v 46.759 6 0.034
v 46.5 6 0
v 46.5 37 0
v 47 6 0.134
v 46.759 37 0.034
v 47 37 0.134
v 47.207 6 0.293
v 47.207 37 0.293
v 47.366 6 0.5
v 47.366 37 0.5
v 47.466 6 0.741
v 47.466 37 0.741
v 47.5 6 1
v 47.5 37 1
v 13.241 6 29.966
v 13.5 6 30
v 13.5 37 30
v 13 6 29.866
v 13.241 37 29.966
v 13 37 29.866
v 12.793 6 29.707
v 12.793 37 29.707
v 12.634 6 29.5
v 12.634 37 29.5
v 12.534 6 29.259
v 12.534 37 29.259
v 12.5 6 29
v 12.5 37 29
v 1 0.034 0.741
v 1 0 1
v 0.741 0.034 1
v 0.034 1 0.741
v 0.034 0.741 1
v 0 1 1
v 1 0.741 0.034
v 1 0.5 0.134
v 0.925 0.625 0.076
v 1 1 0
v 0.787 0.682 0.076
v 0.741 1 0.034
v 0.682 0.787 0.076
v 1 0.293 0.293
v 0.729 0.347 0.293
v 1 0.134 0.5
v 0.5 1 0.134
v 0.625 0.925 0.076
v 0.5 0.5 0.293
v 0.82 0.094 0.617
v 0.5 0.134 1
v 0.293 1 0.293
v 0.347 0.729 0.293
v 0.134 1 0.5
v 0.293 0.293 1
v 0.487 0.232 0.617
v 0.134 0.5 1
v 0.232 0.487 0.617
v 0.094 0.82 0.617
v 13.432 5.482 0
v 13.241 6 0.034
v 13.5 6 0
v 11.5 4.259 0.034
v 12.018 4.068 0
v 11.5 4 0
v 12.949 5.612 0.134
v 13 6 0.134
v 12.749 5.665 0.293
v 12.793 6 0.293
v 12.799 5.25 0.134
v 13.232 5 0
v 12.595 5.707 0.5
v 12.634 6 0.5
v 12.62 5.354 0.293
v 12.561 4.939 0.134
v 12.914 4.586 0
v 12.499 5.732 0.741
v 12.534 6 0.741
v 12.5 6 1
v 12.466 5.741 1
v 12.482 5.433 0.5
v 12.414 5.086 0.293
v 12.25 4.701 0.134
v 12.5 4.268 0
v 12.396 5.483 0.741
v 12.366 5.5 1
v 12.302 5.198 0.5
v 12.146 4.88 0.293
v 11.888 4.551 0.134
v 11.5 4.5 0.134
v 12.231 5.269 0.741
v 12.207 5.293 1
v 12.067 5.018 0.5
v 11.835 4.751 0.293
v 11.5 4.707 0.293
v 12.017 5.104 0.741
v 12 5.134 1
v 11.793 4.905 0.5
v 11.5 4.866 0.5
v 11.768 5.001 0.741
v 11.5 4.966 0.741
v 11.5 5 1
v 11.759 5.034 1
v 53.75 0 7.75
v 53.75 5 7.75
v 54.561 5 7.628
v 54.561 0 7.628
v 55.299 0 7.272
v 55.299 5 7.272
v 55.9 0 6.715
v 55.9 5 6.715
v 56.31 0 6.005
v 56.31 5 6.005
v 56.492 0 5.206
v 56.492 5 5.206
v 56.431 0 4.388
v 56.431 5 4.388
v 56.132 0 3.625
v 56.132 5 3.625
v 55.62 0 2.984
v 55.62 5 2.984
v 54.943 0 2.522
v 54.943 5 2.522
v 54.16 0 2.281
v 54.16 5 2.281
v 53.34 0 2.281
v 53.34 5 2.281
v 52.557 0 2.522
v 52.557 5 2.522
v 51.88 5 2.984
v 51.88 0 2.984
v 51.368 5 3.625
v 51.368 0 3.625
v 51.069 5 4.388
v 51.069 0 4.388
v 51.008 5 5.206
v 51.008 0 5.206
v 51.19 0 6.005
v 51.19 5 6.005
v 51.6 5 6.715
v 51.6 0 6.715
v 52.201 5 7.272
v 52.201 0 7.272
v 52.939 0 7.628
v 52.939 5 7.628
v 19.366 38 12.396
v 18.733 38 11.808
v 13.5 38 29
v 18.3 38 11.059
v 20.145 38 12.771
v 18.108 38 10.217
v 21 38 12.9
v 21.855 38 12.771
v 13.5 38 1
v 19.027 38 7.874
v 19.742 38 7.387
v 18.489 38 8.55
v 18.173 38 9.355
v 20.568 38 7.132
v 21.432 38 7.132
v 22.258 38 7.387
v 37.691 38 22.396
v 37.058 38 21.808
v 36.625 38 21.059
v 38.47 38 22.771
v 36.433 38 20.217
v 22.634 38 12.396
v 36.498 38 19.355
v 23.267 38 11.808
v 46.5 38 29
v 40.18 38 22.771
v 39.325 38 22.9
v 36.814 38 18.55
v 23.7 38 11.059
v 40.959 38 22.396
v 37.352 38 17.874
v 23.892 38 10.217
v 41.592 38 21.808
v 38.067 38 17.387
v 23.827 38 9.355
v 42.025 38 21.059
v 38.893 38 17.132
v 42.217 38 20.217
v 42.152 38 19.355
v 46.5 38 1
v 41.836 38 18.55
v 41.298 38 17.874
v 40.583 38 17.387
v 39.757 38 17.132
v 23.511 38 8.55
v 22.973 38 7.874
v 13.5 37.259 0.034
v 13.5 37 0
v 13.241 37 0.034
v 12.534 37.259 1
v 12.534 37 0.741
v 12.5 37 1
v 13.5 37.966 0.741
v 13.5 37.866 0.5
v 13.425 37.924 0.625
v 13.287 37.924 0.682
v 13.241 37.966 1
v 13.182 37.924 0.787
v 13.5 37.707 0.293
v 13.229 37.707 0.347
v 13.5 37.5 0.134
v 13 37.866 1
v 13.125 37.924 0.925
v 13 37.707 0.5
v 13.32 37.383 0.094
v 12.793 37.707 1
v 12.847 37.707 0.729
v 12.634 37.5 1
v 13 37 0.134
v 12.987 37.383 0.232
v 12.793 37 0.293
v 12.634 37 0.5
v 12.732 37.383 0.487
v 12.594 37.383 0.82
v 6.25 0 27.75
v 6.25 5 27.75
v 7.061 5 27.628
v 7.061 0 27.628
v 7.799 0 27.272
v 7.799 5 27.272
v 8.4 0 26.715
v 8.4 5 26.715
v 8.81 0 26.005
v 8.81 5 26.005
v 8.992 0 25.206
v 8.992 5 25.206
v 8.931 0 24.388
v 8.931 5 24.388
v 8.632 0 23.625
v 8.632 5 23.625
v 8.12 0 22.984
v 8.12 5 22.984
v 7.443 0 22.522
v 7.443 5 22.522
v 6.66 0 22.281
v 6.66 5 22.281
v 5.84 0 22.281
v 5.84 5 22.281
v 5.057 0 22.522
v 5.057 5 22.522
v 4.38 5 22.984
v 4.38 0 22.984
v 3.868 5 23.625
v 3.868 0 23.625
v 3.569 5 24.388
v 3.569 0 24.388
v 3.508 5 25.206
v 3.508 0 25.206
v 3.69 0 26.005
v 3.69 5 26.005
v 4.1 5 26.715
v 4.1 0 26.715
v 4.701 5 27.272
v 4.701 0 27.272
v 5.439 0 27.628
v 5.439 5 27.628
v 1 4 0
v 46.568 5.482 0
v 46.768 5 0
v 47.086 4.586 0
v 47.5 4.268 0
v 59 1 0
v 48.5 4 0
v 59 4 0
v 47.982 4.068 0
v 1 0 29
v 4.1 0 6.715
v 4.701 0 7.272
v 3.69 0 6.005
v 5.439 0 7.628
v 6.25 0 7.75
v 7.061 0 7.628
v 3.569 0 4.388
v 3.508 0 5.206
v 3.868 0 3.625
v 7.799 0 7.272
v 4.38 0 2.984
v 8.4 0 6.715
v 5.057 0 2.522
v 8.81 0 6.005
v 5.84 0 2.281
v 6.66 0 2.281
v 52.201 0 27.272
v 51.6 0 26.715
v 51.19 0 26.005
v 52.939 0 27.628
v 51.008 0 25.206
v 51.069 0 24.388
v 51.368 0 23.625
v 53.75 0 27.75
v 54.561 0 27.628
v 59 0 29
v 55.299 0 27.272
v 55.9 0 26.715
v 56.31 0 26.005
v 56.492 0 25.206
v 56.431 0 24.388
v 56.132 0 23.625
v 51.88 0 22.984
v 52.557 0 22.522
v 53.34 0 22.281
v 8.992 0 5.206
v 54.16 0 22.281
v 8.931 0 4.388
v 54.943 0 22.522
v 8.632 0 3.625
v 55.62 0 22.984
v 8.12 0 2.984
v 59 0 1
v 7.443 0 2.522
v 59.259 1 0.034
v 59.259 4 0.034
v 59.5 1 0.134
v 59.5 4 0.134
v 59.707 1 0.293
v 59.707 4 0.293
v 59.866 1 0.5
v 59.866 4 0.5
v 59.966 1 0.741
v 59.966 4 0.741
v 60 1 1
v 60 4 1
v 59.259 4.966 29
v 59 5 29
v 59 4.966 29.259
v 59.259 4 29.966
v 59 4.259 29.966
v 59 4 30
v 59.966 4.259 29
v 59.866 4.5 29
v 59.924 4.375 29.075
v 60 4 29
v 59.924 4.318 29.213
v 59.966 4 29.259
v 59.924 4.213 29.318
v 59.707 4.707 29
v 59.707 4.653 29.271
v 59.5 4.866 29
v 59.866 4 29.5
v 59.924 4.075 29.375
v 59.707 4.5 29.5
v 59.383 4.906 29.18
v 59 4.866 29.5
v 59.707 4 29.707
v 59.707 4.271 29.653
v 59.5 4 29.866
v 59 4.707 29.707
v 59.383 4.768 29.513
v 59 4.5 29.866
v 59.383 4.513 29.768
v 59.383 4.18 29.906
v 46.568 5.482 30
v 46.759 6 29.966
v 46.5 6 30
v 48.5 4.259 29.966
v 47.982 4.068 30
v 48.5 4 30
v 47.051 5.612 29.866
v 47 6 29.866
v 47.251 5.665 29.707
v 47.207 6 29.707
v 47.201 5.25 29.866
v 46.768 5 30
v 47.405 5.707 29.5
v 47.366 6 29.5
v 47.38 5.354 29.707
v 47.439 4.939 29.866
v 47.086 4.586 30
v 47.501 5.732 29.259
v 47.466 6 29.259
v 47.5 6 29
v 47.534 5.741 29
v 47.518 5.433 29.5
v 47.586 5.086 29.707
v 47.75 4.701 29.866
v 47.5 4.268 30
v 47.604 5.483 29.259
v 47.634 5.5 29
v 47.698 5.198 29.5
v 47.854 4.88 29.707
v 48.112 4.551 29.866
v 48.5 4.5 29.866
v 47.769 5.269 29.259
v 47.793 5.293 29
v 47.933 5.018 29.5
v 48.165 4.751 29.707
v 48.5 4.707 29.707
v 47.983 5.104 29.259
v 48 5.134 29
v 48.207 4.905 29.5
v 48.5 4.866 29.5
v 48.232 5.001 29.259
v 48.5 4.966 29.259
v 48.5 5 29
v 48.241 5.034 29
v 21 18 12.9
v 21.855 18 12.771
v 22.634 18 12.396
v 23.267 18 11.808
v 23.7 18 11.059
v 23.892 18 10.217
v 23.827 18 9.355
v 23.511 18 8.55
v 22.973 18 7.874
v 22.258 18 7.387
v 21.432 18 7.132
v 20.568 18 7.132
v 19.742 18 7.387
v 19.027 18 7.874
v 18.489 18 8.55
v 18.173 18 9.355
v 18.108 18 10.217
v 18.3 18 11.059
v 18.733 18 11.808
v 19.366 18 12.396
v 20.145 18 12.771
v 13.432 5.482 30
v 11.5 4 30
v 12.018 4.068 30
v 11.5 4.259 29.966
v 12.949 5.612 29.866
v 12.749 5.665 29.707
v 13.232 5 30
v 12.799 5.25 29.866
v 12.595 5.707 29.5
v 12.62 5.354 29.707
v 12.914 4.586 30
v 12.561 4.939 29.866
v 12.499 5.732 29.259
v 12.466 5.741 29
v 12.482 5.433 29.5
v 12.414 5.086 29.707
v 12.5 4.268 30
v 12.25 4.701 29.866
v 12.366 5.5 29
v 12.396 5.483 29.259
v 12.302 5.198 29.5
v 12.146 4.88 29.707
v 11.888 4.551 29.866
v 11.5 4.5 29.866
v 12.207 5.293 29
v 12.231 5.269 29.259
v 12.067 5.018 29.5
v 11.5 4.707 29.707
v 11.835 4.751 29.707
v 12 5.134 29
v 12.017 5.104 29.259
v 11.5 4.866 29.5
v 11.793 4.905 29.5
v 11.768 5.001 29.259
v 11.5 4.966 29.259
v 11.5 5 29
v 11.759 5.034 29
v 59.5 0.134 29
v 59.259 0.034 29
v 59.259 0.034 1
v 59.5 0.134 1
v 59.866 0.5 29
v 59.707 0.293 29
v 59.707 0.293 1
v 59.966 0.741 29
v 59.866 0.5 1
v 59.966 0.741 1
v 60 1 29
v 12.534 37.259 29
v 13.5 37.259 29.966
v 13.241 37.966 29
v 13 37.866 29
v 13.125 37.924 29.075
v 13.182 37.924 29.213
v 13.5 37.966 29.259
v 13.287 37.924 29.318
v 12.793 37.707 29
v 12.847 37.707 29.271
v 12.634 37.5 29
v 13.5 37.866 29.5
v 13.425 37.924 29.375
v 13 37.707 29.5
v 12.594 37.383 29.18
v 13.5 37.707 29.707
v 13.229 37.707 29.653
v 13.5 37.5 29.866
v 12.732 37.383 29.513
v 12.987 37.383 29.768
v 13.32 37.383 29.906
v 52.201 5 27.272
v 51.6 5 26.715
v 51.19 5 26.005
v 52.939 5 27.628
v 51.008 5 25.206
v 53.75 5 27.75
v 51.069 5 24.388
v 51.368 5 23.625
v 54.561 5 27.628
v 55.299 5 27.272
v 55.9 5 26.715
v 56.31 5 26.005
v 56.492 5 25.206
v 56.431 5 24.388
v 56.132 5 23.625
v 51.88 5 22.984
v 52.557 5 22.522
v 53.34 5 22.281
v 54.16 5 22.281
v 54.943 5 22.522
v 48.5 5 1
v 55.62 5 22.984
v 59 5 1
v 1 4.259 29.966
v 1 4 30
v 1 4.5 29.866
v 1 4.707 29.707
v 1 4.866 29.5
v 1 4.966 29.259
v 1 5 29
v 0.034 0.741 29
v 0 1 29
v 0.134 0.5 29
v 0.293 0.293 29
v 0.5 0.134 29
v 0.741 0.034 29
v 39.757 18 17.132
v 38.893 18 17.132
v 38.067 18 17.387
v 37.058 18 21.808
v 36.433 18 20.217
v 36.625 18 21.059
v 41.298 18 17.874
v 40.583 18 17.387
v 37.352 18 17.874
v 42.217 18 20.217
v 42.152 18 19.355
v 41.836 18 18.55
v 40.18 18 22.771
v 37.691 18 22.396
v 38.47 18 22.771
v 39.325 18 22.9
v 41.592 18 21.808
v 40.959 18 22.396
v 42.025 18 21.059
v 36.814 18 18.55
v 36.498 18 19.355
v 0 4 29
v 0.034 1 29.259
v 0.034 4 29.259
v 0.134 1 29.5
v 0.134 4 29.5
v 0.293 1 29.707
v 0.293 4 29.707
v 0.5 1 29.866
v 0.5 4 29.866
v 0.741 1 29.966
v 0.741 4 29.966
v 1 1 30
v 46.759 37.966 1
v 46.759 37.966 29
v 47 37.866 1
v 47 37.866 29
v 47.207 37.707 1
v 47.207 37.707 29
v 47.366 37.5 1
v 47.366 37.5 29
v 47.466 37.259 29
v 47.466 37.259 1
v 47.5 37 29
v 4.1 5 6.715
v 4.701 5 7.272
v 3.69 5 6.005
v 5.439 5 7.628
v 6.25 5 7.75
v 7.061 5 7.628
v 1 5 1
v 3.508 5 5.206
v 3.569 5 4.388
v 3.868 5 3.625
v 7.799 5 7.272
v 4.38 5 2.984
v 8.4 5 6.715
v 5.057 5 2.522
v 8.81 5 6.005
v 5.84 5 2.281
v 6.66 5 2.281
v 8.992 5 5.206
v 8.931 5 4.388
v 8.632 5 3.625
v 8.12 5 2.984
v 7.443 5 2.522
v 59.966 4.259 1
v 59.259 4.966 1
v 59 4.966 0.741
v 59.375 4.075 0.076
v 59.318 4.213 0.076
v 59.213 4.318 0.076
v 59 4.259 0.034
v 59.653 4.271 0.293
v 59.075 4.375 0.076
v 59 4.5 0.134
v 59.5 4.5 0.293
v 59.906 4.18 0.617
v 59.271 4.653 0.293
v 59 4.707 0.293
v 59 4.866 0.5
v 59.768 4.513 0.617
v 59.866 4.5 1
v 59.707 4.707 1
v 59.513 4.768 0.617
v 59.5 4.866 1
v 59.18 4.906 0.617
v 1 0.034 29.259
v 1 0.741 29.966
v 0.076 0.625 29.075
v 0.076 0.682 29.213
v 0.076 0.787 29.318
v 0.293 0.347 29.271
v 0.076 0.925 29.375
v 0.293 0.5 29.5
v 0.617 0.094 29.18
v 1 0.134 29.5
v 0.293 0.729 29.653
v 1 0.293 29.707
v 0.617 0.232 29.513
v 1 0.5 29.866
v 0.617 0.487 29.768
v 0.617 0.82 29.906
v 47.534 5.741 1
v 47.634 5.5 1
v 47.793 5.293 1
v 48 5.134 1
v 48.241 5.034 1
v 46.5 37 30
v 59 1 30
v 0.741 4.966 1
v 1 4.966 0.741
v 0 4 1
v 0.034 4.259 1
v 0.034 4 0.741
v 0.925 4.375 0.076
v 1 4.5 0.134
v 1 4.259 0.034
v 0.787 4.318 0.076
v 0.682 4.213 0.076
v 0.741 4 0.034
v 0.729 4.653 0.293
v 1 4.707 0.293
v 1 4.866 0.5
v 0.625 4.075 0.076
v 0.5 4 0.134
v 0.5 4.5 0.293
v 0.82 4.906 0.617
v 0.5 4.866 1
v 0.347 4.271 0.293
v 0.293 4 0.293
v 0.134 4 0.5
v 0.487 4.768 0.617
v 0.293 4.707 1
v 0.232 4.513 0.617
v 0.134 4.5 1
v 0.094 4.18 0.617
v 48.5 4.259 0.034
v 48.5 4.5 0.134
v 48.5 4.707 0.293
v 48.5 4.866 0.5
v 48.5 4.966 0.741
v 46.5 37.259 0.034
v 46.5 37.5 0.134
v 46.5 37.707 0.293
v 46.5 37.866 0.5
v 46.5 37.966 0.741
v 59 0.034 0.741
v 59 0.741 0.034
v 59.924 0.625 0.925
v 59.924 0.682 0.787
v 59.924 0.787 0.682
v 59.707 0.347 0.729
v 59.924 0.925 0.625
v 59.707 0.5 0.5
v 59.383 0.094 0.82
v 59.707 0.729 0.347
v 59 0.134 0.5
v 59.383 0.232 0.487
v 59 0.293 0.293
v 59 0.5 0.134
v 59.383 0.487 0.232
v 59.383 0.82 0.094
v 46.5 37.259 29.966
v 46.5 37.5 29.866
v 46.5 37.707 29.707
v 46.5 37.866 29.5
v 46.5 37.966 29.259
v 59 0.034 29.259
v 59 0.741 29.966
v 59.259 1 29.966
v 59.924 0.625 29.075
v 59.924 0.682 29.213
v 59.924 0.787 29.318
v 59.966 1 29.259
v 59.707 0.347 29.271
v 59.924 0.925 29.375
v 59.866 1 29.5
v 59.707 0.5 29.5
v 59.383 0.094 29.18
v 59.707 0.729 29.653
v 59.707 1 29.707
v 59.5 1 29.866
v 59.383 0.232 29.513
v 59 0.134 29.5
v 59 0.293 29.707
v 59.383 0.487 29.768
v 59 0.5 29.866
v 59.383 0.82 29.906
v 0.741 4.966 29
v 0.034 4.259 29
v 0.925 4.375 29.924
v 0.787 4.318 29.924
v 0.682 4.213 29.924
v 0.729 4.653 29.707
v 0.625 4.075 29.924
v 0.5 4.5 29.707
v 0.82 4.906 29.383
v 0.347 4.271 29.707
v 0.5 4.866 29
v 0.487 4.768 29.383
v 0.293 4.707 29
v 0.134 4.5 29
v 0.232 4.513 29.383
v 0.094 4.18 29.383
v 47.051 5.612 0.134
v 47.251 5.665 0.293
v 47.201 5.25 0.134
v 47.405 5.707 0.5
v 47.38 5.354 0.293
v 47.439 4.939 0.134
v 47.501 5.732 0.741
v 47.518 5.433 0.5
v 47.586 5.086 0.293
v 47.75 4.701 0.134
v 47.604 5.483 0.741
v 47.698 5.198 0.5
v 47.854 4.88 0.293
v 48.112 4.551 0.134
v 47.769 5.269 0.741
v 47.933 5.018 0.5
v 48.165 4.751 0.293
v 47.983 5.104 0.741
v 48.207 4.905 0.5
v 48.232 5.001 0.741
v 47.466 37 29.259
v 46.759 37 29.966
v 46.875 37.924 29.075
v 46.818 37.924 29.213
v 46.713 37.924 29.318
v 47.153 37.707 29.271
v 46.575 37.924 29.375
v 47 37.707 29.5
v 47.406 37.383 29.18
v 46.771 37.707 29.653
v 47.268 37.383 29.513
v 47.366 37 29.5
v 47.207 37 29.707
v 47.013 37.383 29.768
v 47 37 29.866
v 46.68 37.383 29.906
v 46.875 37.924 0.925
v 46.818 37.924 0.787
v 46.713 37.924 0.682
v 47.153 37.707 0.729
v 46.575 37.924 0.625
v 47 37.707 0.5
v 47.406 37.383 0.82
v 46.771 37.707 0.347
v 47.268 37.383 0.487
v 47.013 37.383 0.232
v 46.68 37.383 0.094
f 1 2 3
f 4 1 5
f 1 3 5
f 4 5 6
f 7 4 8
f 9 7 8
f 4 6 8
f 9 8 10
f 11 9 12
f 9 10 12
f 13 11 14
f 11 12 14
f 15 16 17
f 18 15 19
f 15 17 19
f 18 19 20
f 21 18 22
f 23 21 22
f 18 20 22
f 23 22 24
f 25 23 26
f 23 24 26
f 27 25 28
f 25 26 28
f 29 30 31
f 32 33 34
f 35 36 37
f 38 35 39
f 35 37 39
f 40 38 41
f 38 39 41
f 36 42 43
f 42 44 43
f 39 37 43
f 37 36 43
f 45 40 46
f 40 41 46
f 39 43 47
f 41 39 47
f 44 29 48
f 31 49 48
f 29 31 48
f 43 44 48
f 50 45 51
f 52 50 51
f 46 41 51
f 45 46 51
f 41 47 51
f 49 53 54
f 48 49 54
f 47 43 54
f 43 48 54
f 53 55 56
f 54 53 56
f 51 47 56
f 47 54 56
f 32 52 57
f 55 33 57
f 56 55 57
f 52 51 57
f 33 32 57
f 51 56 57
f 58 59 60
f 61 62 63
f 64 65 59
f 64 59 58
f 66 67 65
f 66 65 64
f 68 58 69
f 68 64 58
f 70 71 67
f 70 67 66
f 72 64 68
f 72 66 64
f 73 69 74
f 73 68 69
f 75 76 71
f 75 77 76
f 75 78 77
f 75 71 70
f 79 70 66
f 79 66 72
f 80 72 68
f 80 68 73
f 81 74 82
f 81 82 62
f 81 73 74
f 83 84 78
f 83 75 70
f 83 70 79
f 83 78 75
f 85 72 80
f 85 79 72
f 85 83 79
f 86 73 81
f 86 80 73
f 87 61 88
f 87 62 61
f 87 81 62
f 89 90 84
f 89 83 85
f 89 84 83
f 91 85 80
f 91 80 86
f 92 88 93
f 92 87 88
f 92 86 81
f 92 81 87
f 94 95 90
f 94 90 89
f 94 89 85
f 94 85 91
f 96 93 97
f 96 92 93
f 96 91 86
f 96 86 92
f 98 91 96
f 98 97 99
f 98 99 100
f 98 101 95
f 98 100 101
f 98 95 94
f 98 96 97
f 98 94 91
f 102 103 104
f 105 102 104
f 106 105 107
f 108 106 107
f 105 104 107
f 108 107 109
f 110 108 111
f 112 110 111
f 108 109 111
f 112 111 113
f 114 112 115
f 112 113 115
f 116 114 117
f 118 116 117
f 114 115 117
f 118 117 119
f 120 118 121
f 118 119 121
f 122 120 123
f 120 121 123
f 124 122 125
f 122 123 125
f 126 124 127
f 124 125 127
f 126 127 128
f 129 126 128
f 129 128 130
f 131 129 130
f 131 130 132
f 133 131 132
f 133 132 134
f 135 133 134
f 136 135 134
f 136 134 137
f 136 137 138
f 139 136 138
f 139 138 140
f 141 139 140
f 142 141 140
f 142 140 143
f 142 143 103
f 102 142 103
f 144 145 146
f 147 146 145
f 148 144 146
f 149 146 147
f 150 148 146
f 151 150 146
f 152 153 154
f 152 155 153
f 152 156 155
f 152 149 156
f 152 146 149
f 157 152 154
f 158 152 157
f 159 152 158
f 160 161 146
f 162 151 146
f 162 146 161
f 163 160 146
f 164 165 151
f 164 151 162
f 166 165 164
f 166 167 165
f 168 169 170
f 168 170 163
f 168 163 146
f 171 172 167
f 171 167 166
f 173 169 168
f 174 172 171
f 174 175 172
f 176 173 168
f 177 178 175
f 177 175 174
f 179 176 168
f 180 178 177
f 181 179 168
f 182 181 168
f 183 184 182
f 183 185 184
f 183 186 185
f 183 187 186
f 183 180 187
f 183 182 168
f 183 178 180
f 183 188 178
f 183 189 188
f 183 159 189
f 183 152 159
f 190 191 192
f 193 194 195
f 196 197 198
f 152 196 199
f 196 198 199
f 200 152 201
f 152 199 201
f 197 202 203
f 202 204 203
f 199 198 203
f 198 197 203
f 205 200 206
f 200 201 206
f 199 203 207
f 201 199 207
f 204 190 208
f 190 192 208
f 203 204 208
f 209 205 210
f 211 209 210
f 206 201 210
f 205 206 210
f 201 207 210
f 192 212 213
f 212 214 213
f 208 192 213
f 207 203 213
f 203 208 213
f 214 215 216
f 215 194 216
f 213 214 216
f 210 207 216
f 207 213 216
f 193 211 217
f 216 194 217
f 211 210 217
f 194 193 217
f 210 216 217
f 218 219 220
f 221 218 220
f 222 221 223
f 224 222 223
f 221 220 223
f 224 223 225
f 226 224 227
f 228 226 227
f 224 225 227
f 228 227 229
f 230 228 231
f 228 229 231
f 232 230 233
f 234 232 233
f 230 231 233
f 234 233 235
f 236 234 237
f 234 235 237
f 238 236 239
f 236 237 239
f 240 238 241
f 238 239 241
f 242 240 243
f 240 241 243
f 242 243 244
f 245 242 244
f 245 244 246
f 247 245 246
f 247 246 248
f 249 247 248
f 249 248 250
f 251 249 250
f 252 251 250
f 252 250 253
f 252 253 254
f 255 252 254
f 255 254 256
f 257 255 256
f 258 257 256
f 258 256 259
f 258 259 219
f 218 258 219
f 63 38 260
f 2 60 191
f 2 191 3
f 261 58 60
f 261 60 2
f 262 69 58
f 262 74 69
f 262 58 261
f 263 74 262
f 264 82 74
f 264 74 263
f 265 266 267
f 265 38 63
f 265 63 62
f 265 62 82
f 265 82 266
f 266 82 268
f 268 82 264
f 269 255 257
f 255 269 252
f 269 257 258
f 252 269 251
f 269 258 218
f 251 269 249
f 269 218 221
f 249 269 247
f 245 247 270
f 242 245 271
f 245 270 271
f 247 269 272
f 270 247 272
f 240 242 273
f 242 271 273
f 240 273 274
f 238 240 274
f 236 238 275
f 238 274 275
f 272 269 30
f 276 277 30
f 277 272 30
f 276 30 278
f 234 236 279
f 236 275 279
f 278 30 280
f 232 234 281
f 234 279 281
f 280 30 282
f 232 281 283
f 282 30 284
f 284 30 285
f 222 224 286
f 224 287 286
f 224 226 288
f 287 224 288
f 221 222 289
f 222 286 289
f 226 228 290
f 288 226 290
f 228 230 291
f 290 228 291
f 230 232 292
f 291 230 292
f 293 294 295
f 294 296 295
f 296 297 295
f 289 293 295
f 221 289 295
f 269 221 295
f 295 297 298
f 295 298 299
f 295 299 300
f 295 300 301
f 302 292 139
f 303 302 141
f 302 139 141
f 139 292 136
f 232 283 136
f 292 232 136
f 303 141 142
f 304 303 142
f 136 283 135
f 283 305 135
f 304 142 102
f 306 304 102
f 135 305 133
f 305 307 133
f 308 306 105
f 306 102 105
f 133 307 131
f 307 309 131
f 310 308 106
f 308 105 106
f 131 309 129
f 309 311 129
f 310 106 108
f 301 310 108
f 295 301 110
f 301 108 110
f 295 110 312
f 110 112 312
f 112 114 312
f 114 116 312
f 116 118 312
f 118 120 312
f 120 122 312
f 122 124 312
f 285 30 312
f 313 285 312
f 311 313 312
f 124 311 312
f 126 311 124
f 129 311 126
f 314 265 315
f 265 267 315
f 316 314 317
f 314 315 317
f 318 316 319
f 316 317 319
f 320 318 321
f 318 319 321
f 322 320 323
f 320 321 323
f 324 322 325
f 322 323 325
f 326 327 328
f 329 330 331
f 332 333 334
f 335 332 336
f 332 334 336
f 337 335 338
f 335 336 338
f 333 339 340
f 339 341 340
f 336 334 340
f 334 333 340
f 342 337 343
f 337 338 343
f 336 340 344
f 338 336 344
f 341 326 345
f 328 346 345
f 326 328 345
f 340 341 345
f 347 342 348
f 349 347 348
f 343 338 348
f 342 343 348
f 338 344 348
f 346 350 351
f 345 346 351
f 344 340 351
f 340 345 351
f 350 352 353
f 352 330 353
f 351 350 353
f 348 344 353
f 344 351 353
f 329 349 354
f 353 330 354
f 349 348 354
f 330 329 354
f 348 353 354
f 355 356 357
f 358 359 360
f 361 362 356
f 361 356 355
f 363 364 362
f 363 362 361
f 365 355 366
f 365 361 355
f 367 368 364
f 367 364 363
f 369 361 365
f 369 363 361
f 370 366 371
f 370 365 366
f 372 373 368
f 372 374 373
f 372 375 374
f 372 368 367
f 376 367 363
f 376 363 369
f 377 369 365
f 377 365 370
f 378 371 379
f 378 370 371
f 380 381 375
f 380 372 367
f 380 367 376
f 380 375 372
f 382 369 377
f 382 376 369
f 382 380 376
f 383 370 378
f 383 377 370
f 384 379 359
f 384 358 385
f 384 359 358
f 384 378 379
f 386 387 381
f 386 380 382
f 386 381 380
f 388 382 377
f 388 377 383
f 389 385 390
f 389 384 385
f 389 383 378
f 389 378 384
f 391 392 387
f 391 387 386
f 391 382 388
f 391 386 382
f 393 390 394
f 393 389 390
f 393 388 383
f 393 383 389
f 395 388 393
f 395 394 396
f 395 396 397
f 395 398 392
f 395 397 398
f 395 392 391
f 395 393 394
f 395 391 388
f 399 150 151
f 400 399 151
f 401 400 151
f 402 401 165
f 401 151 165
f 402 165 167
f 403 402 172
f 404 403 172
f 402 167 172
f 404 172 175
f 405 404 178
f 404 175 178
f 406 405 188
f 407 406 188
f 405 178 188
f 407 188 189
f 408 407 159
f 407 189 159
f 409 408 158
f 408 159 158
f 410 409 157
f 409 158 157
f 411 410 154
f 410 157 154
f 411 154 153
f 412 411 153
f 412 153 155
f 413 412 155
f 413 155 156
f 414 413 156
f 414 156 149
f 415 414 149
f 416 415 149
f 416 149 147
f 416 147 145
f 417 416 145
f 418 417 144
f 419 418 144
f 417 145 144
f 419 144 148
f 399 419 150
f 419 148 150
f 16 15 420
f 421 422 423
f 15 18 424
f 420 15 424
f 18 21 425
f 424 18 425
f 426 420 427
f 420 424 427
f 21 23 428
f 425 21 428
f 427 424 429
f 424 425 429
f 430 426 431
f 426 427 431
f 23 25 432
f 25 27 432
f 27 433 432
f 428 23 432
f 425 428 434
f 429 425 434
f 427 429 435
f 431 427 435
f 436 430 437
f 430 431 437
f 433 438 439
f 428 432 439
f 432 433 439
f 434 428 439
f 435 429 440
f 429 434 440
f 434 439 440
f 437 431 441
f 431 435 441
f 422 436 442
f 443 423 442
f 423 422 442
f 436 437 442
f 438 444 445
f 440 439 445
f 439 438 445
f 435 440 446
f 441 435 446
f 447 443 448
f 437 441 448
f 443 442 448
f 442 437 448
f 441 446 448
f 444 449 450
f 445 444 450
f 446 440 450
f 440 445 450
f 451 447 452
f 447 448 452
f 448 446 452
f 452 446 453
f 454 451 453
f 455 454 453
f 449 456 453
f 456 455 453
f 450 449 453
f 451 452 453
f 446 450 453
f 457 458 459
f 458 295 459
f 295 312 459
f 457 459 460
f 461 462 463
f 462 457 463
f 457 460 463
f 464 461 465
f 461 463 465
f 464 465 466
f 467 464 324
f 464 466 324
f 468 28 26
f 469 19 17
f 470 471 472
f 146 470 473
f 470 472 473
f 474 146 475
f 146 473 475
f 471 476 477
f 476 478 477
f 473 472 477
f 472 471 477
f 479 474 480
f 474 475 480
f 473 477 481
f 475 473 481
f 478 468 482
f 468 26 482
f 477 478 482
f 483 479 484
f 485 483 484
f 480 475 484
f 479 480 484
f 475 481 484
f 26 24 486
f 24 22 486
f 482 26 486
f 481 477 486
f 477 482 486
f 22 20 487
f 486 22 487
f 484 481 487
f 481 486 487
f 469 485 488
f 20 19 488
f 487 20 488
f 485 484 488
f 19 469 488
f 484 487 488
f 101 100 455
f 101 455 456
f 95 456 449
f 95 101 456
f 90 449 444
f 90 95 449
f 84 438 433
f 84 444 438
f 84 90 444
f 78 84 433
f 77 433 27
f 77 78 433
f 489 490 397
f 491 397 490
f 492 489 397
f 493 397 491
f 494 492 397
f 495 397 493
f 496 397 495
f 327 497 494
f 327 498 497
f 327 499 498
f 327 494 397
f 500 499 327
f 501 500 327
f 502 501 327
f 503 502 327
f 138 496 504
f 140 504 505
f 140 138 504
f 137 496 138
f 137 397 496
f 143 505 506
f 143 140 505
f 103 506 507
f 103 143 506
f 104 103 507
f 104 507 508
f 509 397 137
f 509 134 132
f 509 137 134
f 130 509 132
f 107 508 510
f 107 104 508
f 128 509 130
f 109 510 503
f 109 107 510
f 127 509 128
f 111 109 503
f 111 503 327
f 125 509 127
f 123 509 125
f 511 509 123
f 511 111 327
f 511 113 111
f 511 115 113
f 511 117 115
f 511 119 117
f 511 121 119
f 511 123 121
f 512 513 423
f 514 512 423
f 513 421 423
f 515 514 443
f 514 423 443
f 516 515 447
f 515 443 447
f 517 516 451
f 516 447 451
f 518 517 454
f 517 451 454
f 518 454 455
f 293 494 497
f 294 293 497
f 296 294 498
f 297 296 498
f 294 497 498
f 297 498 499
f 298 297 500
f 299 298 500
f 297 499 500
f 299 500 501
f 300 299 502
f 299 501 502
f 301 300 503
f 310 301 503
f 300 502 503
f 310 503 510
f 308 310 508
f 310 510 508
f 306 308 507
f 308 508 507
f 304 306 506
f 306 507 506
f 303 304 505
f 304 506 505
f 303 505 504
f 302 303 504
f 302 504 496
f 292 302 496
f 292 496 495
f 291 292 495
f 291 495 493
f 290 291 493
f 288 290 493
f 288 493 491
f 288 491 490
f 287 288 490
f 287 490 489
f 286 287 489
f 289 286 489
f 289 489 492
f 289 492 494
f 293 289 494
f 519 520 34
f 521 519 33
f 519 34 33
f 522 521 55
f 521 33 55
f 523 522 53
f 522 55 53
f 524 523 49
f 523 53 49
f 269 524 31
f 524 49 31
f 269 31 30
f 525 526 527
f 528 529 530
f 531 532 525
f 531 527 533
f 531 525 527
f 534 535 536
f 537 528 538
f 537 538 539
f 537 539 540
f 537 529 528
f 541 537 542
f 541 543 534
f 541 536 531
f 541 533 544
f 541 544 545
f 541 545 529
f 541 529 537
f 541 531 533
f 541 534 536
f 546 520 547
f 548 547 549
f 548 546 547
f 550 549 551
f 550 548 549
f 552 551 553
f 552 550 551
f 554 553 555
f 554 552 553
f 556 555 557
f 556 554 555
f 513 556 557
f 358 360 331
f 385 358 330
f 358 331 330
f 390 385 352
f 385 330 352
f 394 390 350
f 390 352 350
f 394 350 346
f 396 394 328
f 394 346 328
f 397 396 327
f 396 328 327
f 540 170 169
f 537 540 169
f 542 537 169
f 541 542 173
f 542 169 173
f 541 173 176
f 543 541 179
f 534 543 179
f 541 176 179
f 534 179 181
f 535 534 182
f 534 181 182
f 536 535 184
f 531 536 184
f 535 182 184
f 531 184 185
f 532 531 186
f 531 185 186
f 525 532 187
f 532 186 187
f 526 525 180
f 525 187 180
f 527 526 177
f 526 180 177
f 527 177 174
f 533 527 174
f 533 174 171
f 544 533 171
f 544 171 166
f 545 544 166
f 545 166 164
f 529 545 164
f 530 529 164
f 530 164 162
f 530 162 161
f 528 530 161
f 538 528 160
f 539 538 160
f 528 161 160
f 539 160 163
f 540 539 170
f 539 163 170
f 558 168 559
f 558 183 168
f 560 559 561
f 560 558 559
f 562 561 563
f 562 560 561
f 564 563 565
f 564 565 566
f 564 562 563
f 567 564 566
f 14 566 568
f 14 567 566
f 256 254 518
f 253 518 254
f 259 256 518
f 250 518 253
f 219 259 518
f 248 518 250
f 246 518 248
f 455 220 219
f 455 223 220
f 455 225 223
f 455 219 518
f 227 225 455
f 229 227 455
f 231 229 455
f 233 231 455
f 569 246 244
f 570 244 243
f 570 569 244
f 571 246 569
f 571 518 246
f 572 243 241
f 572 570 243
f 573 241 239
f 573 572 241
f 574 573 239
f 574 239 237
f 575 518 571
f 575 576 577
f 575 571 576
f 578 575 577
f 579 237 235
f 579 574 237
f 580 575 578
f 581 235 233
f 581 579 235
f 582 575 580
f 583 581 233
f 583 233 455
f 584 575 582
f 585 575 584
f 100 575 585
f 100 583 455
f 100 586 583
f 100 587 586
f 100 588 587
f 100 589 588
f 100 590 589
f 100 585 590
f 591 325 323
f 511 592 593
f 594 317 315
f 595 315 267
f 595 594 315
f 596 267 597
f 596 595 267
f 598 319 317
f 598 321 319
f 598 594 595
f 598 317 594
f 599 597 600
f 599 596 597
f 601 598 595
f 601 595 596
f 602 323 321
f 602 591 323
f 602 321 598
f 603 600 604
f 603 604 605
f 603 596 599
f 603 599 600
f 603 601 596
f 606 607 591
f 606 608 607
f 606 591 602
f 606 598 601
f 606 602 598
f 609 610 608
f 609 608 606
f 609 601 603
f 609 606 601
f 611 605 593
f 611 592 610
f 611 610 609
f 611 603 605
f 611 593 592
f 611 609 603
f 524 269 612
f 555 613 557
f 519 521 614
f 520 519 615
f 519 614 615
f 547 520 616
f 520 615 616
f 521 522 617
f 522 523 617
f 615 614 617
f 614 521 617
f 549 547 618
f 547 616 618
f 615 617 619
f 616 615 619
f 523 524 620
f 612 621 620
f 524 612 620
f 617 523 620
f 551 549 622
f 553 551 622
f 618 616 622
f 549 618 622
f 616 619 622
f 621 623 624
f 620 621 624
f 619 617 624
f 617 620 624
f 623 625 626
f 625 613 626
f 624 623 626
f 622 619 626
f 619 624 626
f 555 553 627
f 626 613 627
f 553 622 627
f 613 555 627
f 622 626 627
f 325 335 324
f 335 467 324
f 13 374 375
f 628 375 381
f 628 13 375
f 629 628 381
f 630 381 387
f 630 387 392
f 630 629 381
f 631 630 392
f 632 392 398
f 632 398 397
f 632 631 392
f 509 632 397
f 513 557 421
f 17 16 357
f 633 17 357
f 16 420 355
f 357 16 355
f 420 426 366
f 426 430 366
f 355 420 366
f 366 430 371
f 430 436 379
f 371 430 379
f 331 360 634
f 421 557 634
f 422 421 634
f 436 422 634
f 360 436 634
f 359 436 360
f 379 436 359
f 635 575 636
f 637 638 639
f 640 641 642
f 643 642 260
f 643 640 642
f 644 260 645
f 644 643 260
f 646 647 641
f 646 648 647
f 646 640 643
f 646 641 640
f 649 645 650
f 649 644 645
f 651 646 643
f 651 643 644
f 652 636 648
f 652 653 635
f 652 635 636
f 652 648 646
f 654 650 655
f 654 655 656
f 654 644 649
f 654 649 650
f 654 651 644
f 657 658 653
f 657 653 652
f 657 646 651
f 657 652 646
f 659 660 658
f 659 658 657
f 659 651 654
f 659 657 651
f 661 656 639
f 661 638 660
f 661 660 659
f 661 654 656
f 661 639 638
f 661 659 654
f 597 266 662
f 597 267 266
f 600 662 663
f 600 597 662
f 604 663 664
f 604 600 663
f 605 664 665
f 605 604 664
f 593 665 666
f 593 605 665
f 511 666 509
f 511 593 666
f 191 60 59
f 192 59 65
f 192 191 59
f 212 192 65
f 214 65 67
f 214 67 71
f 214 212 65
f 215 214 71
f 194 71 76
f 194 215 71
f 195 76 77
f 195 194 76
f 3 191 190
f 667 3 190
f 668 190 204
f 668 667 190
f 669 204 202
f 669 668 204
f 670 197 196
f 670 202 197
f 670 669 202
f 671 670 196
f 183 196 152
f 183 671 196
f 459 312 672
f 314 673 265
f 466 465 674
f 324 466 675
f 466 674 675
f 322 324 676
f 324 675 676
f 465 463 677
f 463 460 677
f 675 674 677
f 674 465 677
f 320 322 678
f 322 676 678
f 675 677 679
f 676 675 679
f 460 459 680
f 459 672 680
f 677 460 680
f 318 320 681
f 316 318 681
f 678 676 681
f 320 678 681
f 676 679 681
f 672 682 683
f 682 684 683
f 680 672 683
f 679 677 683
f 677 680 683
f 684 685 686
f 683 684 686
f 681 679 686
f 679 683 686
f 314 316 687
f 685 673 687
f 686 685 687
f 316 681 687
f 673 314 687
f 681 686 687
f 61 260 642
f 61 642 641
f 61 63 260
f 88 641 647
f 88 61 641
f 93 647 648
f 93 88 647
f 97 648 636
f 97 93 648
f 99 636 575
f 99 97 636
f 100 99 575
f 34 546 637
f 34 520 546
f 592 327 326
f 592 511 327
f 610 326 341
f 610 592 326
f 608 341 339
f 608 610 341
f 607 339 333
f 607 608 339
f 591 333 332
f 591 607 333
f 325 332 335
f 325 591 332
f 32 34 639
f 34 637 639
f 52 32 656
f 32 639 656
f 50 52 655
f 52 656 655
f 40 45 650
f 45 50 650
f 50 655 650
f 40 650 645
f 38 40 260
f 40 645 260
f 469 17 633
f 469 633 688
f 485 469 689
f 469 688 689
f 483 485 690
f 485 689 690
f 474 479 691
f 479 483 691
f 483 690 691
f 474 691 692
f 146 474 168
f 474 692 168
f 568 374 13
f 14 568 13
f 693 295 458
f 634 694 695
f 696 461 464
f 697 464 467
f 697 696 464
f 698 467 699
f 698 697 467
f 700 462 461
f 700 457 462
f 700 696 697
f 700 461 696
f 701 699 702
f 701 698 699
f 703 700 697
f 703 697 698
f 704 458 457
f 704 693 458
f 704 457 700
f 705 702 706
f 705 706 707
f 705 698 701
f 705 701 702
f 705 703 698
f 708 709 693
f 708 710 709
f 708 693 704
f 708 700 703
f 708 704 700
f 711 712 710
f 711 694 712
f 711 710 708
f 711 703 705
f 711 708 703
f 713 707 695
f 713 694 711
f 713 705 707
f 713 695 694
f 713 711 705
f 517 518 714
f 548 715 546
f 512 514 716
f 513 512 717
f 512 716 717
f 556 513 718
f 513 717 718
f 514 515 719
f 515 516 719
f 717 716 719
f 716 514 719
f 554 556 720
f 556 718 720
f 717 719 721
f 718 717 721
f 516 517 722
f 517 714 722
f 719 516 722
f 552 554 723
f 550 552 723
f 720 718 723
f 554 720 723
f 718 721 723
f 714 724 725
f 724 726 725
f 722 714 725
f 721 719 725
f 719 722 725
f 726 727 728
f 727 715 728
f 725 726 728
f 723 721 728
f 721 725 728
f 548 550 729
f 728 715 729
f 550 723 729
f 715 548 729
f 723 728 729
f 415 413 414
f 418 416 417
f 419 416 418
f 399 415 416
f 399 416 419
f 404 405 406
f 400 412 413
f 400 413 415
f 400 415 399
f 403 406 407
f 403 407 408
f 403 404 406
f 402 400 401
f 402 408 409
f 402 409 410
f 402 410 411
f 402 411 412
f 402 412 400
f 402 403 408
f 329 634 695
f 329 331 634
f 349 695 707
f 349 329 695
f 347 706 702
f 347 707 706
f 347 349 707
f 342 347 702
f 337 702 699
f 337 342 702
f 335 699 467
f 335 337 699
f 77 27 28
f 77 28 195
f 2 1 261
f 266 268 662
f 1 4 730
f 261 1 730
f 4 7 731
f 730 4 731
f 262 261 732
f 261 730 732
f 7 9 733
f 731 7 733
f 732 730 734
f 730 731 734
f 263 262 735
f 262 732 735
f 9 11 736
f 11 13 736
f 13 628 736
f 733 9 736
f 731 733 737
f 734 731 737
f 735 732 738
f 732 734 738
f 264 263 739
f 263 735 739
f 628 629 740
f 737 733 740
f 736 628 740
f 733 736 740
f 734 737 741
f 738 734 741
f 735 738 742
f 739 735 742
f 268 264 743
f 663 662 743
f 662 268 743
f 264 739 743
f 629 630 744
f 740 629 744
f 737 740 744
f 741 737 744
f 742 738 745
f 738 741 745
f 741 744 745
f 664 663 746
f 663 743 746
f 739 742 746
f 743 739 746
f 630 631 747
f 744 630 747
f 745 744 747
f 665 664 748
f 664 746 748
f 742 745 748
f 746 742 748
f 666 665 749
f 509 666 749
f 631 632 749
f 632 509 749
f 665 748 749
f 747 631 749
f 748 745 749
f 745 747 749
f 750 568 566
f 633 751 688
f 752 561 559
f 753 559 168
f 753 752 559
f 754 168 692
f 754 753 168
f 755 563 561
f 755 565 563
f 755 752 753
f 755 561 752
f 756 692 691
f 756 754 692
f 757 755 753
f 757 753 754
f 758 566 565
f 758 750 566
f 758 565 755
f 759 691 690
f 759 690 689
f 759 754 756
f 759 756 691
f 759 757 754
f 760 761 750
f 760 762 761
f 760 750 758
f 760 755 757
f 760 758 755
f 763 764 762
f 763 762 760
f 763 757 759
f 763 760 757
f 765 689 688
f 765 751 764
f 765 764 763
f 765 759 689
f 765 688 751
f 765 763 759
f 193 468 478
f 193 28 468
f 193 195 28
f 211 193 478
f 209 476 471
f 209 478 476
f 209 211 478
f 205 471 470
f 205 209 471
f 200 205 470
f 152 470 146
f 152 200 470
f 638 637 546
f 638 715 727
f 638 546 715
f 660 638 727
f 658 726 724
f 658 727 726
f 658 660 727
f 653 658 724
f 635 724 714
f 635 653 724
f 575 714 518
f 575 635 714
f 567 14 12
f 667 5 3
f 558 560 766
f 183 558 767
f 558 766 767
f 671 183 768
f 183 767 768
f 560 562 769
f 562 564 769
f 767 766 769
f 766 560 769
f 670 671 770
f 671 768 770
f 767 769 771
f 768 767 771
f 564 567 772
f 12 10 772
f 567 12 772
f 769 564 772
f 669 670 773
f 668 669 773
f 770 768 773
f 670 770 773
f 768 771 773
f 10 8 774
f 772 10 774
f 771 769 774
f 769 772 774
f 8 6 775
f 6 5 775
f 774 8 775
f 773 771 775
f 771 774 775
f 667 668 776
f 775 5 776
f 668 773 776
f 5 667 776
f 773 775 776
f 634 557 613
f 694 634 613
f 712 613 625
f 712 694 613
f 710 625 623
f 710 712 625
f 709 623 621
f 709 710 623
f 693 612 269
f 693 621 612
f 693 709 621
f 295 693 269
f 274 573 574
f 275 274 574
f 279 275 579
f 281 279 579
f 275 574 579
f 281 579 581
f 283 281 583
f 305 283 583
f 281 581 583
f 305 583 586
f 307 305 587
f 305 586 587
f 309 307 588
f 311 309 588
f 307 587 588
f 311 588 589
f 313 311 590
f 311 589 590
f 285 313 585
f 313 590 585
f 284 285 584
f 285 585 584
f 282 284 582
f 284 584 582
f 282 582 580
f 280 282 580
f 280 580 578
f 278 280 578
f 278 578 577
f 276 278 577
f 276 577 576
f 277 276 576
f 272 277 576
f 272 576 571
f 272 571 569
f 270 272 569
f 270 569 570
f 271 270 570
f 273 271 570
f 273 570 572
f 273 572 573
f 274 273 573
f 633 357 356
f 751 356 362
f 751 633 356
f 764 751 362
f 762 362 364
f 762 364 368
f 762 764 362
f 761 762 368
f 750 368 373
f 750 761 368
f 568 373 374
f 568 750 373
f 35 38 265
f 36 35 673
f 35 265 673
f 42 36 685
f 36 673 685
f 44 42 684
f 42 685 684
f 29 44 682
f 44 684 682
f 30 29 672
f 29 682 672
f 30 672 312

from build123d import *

# Parameters (mm, degrees)
SKETCH2_W           = 60
SKETCH2_H           = 30
BOSS_EXTRUDE1_DEPTH = 5
SKETCH3_W           = 35
SKETCH3_H           = 30
BOSS_EXTRUDE2_DEPTH = 33
SKETCH5_R           = 2.9
CUT_EXTRUDE1_DEPTH  = 20
SKETCH6_R           = 2.75
CUT_EXTRUDE2_DEPTH  = 75.759614766
FILLET1_R           = 1


with BuildPart() as part:
    # Sketch2 → Boss-Extrude1 (new body)
    with BuildSketch(Plane(origin=(0, 0, 0), x_dir=(1, 0, 0), z_dir=(0, 1, 0))):
        with Locations((30, -15)):
            Rectangle(SKETCH2_W, SKETCH2_H)
    extrude(amount=BOSS_EXTRUDE1_DEPTH)

    # Sketch3 → Boss-Extrude2 (add)
    with BuildSketch(Plane(origin=(0, 5, 0), x_dir=(1, 0, 0), z_dir=(0, 1, 0))):
        with Locations((30, -15)):
            Rectangle(SKETCH3_W, SKETCH3_H)
    extrude(amount=BOSS_EXTRUDE2_DEPTH)

    # Sketch5 → Cut-Extrude1 (cut)
    with BuildSketch(Plane(origin=(0, 38, 0), x_dir=(1, 0, 0), z_dir=(0, 1, 0))):
        with Locations(Location((21, -10, 0), (0, 0, 270))):
            Circle(SKETCH5_R)
        with Locations(Location((39.325, -20, 0), (0, 0, 270))):
            Circle(SKETCH5_R)
    extrude(amount=-CUT_EXTRUDE1_DEPTH, mode=Mode.SUBTRACT)

    # Sketch6 → Cut-Extrude2 (cut, through all)
    with BuildSketch(Plane(origin=(0, 5, 0), x_dir=(1, 0, 0), z_dir=(0, 1, 0))):
        with Locations(Location((53.75, -5, 0), (0, 0, 270))):
            Circle(SKETCH6_R)
        with Locations(Location((53.75, -25, 0), (0, 0, 270))):
            Circle(SKETCH6_R)
        with Locations(Location((6.25, -25, 0), (0, 0, 270))):
            Circle(SKETCH6_R)
        with Locations(Location((6.25, -5, 0), (0, 0, 270))):
            Circle(SKETCH6_R)
    extrude(amount=-CUT_EXTRUDE2_DEPTH, mode=Mode.SUBTRACT)

    # Fillet1
    fillet1_edges = [part.edges().sort_by_distance(p)[0] for p in [
        (0, 5, 15),
        (6.25, 5, 0),
        (53.75, 5, 30),
        (6.25, 5, 30),
        (47.5, 5, 15),
        (47.5, 21.5, 30),
        (47.5, 21.5, 0),
        (12.5, 5, 15),
        (12.5, 21.5, 0),
        (12.5, 21.5, 30),
        (47.5, 38, 15),
        (30, 38, 0),
        (12.5, 38, 15),
        (30, 38, 30),
        (60, 5, 15),
        (30, 0, 30),
        (0, 0, 15),
        (30, 0, 0),
        (60, 0, 15),
        (60, 2.5, 30),
        (0, 2.5, 30),
        (0, 2.5, 0),
        (60, 2.5, 0),
        (53.75, 5, 0),
    ]]
    fillet(fillet1_edges, radius=FILLET1_R)


solid = part.part
